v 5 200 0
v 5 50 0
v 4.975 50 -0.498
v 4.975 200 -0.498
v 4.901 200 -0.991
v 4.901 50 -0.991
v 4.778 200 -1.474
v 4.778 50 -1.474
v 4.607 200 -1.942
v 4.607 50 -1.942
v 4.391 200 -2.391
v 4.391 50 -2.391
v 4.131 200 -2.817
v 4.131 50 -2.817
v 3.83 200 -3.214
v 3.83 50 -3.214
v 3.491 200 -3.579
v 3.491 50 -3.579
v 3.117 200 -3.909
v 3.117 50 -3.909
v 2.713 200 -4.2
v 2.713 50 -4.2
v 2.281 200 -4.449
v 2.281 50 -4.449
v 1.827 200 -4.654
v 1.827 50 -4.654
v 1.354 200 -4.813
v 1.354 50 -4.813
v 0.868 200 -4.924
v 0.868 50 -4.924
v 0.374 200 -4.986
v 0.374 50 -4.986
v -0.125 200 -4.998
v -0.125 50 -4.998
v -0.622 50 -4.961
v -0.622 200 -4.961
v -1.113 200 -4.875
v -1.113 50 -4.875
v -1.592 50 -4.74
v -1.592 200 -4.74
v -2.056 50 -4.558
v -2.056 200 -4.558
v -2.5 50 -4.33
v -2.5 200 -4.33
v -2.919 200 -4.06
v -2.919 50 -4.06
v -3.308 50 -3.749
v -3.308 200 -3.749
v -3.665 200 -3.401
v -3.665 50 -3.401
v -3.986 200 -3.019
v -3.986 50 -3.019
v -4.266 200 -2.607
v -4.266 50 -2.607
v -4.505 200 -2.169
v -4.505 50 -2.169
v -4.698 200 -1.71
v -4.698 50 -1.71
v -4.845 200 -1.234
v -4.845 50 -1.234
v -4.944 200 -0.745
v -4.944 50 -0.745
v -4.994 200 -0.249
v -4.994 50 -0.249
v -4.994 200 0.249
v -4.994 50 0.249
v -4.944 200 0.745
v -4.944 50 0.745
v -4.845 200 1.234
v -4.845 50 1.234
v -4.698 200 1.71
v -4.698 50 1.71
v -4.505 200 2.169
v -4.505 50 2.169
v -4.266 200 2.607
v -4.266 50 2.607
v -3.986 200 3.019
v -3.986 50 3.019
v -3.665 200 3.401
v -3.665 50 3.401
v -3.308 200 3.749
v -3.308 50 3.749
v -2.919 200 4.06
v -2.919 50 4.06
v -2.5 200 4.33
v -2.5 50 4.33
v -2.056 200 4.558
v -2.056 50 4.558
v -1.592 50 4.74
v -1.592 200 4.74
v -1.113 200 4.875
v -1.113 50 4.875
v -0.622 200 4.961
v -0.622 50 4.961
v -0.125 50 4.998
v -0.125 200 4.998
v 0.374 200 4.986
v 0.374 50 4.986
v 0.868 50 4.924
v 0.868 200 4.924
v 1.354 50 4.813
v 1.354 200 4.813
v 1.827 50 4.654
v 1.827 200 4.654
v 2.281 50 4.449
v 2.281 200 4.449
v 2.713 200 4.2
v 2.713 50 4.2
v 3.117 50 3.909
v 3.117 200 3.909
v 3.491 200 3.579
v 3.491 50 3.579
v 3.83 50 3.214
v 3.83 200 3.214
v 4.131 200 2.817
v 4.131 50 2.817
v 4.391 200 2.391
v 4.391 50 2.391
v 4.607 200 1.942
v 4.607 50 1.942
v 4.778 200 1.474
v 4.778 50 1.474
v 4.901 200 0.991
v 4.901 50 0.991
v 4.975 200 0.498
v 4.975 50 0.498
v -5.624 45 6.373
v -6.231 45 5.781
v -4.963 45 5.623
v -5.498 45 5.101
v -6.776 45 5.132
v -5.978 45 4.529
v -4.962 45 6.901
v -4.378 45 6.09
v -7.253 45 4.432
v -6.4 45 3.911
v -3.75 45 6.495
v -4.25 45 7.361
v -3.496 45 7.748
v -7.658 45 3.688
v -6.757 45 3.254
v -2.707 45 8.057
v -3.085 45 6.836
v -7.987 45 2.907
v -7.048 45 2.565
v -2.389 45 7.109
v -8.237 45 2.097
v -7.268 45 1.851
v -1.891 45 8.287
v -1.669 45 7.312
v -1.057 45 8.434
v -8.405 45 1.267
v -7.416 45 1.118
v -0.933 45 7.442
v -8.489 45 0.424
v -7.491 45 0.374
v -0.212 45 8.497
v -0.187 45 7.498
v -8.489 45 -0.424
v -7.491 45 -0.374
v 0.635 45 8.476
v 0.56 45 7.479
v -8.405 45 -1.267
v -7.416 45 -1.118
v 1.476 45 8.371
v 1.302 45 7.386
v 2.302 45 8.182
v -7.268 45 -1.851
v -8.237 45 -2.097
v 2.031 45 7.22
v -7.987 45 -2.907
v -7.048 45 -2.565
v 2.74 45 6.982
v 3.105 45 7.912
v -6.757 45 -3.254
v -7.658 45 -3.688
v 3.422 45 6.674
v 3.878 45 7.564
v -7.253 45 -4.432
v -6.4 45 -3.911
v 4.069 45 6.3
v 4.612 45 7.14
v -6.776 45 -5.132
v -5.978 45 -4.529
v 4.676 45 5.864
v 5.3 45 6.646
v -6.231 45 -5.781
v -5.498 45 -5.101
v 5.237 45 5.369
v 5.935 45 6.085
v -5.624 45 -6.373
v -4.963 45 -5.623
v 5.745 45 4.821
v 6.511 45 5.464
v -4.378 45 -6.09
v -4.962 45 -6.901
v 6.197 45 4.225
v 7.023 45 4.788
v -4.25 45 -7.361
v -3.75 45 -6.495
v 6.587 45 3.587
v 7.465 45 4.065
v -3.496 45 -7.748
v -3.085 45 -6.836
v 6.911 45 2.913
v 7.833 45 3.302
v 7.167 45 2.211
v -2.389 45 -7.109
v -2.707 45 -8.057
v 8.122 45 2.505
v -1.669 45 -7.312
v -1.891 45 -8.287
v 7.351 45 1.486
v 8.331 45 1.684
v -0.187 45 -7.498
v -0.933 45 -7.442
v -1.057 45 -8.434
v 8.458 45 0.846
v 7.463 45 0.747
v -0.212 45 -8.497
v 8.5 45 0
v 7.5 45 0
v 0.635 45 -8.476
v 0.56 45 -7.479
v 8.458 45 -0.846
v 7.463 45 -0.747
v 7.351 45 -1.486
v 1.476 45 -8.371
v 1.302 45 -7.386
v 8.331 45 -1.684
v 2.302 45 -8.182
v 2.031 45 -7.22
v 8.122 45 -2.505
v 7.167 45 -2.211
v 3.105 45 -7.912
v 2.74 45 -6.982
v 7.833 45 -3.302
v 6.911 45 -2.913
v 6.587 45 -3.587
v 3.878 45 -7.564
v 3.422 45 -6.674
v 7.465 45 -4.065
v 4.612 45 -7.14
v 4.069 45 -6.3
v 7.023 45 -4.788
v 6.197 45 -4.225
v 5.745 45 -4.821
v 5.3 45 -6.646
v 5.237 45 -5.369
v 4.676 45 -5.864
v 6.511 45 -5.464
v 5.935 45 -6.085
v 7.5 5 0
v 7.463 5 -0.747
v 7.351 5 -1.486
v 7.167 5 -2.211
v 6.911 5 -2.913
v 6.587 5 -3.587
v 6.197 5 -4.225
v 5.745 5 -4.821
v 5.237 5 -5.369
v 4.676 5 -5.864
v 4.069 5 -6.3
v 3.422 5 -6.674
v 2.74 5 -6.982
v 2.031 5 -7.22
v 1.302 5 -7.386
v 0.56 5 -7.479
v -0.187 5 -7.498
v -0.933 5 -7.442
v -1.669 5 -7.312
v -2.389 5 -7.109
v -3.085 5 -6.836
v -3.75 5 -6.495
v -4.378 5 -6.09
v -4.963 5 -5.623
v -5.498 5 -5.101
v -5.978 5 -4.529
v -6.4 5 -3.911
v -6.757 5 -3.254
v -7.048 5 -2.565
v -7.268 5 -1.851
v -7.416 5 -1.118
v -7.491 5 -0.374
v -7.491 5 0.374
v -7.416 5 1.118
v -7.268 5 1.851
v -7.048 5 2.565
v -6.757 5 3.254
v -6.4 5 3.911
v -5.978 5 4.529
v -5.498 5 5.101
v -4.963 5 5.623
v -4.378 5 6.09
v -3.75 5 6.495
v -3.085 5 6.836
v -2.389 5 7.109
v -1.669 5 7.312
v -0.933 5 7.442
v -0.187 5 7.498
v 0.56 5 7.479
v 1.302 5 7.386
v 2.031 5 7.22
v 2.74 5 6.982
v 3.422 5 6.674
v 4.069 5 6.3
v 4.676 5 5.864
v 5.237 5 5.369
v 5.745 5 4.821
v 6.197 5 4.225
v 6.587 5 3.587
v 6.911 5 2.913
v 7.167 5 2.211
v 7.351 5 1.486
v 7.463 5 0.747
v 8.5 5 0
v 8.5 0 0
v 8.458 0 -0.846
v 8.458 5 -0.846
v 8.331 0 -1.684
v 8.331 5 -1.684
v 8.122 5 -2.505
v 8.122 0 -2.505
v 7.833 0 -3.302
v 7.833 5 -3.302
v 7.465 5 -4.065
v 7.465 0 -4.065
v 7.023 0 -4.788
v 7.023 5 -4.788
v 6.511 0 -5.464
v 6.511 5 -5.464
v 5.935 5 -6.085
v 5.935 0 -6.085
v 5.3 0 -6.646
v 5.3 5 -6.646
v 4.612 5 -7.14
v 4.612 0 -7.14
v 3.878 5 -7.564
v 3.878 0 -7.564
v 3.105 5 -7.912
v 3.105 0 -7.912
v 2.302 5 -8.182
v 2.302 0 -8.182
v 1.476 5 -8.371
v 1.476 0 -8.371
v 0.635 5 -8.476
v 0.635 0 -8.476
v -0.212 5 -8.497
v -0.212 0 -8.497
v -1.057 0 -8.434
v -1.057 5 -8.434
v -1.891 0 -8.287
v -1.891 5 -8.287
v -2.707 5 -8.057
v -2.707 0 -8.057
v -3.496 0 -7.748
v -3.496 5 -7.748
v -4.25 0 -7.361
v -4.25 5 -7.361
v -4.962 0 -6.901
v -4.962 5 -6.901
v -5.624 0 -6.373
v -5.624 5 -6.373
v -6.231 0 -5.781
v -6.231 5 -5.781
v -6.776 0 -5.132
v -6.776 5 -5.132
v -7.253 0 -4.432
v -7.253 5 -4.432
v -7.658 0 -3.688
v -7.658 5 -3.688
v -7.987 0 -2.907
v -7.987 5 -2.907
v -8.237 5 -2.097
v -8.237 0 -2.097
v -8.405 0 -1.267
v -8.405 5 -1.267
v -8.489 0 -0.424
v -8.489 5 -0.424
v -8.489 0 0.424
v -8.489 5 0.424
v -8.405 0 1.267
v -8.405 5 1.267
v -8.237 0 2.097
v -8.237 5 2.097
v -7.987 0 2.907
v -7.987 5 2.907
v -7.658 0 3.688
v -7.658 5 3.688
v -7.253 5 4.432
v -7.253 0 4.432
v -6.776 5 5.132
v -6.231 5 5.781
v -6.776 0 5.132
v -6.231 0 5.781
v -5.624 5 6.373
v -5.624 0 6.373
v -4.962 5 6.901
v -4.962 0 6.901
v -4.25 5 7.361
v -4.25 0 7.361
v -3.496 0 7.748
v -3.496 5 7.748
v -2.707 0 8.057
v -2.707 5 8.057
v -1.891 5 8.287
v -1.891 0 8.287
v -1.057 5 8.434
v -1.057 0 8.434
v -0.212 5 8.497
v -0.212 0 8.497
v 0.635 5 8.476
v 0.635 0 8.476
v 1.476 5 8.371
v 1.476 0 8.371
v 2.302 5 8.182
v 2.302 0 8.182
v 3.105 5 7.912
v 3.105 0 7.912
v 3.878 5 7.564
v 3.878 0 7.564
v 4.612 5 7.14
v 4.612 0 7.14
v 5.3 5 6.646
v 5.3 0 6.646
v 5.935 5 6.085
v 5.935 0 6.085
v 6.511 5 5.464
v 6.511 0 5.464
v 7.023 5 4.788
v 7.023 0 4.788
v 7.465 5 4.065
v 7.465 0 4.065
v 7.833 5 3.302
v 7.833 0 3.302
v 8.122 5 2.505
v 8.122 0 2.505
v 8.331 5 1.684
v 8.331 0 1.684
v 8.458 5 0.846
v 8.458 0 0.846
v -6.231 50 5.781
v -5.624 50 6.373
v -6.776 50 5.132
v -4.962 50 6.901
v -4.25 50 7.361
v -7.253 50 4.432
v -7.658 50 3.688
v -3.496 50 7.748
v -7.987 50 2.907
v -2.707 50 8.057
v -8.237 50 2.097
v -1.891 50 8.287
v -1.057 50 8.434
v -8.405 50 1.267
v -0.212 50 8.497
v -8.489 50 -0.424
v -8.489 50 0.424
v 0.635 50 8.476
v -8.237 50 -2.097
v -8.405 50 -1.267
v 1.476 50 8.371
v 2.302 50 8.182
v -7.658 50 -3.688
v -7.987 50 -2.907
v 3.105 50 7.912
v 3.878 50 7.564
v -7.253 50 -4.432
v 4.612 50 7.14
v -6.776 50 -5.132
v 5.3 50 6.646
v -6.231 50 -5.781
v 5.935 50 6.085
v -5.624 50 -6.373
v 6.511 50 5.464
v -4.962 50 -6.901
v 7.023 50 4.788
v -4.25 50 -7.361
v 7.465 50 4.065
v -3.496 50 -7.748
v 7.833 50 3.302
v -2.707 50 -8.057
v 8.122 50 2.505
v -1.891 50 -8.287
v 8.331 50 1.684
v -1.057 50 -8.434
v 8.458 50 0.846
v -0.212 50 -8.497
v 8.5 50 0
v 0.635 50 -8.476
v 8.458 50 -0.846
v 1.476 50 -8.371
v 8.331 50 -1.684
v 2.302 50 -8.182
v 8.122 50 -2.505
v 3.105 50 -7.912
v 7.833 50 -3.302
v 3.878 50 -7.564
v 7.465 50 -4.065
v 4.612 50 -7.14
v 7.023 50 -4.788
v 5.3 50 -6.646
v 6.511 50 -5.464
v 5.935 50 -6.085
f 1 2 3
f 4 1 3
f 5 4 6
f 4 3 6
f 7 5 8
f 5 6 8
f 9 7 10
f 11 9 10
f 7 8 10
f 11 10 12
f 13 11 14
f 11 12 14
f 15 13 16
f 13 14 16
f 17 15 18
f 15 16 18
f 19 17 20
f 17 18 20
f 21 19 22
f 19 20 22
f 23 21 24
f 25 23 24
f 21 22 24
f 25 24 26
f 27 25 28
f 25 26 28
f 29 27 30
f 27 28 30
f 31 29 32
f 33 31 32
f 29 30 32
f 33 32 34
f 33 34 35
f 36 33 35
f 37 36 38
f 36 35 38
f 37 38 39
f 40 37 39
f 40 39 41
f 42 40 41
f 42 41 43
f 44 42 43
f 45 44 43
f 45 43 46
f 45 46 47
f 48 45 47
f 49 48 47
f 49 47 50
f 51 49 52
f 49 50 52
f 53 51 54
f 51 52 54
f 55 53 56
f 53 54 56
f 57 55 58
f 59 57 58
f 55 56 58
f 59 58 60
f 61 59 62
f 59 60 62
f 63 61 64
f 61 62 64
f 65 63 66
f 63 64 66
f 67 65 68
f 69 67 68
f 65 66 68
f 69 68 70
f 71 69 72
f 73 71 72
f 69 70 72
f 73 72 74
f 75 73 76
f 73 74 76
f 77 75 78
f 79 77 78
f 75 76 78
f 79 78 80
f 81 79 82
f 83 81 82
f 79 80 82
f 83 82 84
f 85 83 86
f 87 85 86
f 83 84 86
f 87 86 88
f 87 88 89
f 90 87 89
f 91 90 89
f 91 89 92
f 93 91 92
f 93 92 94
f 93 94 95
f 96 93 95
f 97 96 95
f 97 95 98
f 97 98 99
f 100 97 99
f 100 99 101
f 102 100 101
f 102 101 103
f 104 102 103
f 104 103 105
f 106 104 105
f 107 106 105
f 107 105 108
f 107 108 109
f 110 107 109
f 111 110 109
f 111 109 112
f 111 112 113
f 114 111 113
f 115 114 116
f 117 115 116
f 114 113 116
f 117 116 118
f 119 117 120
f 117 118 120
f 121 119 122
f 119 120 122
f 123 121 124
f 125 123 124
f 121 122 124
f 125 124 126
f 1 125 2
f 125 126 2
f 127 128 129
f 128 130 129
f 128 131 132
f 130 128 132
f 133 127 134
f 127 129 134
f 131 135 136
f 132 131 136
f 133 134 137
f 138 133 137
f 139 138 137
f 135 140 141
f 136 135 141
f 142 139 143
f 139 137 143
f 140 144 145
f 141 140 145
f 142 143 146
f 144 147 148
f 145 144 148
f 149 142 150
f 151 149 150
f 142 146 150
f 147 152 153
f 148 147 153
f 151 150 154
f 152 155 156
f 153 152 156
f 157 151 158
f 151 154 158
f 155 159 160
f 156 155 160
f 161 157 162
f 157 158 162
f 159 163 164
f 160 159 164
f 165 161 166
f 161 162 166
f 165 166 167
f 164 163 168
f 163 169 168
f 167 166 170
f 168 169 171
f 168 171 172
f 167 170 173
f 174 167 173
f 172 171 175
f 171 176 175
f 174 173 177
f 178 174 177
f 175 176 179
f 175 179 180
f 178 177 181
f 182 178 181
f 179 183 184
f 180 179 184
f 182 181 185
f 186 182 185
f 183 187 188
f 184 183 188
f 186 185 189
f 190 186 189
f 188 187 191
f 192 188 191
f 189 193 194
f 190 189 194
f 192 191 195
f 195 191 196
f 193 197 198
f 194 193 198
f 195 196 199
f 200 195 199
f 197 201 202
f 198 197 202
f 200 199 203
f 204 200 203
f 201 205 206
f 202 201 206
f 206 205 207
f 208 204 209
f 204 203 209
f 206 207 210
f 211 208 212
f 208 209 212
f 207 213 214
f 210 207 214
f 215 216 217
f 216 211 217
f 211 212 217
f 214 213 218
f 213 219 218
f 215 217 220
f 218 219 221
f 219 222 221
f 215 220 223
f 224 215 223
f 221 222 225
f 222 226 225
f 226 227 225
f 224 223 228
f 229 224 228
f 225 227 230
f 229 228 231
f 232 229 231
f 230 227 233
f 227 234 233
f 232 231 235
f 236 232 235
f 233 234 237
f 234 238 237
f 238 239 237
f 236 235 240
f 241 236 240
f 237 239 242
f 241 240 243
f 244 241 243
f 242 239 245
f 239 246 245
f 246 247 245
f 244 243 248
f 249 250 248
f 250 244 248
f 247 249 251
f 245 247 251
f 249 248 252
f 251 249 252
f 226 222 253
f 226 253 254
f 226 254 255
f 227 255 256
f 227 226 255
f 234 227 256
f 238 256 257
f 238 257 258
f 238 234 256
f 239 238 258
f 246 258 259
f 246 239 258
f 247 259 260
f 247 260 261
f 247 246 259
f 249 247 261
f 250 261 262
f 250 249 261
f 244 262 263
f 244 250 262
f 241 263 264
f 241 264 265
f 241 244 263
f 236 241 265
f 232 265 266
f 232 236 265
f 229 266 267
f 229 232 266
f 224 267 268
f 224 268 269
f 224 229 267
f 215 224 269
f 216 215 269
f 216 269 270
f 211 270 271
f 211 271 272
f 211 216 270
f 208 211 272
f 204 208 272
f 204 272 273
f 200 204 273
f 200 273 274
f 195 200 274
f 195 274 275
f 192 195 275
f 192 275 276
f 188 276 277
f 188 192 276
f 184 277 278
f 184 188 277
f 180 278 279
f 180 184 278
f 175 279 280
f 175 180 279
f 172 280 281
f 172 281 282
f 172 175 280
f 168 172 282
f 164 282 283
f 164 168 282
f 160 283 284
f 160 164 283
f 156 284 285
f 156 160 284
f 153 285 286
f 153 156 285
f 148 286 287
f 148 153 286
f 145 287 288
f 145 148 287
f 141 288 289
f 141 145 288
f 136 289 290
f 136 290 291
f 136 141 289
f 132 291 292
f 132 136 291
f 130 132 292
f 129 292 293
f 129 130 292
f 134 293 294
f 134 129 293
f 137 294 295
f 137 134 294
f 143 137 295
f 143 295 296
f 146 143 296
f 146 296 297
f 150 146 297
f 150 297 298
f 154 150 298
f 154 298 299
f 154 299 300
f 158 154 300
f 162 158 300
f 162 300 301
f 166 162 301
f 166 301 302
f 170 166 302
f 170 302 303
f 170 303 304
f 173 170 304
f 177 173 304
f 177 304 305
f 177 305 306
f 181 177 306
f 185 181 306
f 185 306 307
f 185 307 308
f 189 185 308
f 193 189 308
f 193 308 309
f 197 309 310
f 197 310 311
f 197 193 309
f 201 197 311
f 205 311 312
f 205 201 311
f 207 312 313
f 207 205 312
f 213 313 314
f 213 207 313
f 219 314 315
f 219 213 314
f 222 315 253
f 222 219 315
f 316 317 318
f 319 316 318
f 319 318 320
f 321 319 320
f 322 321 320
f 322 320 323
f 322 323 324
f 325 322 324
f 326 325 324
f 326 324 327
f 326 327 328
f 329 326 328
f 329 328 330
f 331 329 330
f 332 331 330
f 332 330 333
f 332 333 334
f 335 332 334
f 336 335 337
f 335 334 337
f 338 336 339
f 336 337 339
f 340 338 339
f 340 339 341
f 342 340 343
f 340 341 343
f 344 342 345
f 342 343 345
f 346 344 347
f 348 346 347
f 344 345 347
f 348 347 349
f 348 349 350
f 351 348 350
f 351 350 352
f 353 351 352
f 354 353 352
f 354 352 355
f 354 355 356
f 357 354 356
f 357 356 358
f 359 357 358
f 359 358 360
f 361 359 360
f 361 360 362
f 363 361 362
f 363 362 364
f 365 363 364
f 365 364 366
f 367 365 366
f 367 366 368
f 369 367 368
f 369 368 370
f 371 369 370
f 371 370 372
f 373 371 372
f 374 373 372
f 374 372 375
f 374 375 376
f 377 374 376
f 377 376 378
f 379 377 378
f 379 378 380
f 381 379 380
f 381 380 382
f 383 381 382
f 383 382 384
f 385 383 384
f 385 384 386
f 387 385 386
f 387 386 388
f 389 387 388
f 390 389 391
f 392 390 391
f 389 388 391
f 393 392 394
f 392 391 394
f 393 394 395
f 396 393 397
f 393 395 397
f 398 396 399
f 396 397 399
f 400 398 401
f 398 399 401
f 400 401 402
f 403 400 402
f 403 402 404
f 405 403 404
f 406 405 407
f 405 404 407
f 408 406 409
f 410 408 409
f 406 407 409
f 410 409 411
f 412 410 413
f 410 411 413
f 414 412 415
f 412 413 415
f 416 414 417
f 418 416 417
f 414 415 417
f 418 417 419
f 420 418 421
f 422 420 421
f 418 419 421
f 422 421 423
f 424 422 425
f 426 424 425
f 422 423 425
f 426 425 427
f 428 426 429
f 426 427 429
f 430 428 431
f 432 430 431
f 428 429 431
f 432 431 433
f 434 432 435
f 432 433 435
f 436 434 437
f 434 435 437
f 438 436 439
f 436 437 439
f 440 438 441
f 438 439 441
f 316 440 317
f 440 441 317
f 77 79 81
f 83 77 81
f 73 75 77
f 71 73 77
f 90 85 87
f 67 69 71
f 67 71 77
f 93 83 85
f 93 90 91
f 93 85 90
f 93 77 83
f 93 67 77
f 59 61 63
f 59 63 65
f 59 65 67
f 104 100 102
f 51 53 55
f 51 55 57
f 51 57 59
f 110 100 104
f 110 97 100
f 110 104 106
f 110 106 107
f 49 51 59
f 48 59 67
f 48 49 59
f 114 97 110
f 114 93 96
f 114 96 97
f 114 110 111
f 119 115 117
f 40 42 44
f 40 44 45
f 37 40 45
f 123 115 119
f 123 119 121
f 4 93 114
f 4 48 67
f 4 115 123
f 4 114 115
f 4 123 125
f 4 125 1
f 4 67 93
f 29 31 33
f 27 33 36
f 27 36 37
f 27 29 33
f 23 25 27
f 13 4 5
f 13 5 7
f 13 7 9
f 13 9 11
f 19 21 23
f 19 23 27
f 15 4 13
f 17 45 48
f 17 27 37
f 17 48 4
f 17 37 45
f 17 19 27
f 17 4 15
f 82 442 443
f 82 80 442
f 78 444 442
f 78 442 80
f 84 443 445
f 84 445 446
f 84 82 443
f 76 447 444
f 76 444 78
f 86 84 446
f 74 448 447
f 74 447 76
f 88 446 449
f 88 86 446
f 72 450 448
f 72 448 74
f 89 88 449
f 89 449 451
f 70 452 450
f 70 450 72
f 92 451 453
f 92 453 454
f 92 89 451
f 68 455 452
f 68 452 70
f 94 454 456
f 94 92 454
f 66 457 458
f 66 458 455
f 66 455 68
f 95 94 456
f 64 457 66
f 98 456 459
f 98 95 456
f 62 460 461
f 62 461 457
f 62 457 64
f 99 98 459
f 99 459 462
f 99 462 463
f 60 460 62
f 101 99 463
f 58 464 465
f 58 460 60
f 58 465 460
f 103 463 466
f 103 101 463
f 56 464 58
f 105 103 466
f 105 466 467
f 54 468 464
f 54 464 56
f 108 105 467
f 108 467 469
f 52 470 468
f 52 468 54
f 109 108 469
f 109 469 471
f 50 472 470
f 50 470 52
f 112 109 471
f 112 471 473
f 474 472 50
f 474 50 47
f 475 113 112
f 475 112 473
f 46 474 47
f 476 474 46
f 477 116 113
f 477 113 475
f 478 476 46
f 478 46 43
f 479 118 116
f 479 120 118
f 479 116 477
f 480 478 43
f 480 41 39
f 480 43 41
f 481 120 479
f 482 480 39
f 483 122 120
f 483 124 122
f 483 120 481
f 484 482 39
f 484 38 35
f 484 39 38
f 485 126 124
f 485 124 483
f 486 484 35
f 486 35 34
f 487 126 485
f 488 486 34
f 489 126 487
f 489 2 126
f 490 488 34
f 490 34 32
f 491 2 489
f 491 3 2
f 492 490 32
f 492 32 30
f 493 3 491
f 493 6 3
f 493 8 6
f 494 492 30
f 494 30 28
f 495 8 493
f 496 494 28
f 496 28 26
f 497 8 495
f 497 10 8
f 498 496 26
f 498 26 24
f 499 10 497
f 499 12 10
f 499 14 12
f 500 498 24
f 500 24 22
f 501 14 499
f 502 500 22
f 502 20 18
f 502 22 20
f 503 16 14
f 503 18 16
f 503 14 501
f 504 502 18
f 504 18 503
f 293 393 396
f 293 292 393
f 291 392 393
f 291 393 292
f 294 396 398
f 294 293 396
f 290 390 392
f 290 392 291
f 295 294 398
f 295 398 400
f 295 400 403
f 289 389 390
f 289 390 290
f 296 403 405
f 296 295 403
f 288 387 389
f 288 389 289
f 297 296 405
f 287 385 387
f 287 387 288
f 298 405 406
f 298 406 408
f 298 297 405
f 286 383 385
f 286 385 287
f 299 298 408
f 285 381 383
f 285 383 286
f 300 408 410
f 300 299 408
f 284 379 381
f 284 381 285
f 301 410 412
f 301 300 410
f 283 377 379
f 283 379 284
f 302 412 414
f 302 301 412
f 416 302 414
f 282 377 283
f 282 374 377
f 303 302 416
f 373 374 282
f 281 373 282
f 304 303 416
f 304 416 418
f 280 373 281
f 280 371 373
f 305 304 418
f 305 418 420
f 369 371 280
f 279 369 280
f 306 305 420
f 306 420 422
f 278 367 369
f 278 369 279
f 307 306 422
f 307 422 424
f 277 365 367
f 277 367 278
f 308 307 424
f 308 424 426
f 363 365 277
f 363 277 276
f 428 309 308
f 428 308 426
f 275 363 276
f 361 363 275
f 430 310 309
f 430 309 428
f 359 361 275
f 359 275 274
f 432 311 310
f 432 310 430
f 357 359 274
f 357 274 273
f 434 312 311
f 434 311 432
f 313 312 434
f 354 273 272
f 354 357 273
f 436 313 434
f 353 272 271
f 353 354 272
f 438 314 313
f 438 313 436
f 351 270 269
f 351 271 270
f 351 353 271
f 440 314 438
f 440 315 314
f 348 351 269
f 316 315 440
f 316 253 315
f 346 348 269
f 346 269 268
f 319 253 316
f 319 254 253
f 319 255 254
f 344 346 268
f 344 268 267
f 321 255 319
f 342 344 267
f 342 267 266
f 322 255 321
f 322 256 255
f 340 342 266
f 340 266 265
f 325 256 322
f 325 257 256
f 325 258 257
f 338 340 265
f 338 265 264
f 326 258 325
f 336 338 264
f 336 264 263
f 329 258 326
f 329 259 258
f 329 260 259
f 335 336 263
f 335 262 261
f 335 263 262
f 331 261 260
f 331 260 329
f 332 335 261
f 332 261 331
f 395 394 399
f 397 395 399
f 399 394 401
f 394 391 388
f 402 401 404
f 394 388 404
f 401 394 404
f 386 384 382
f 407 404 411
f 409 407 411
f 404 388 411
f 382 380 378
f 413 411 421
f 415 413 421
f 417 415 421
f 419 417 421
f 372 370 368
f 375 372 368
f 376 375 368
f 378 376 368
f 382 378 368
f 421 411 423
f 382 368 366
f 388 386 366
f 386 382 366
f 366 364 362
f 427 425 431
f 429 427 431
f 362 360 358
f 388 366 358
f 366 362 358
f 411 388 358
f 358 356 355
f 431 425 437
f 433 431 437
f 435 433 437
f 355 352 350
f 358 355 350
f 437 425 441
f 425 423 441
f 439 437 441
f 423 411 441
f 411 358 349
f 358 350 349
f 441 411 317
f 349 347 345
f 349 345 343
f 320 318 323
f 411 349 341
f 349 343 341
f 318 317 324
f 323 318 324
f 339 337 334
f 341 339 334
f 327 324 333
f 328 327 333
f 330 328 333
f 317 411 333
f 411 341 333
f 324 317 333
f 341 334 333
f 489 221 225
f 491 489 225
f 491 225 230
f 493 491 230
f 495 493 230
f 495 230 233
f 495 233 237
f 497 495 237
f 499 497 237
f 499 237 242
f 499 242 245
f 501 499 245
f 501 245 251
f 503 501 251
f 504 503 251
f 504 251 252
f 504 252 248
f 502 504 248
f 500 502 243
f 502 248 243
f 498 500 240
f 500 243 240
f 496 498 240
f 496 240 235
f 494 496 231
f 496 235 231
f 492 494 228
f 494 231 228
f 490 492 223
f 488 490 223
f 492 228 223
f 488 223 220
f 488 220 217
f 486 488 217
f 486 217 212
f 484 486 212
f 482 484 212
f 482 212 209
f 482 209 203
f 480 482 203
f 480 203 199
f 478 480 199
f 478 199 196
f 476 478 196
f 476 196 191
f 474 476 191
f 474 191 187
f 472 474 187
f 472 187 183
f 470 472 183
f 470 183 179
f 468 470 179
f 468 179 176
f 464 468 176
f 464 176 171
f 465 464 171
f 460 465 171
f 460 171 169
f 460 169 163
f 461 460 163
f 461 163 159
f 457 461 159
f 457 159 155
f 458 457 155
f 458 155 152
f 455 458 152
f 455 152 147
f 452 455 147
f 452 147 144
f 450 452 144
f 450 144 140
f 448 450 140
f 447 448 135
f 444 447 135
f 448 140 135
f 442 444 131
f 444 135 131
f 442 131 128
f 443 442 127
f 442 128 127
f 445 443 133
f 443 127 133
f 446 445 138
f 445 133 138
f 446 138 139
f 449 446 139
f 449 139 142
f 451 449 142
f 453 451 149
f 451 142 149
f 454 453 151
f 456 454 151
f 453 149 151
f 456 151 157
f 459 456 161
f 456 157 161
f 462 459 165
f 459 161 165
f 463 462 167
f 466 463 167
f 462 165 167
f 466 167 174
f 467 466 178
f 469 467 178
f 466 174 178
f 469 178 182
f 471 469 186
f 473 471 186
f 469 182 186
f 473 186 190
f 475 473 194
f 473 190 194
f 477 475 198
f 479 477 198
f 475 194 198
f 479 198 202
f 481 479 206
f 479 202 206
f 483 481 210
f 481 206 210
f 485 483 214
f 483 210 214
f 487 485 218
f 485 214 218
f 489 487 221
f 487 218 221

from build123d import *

# Parameters (mm, degrees)
SKETCH1_R           = 8.5
BOSS_EXTRUDE1_DEPTH = 50
SKETCH2_R           = 5
BOSS_EXTRUDE2_DEPTH = 150
SKETCH3_R           = 8.5
SKETCH3_R_2         = 7.5
CUT_EXTRUDE1_DEPTH  = 40


with BuildPart() as part:
    # Sketch1 → Boss-Extrude1 (new body)
    with BuildSketch(Plane(origin=(0, 0, 0), x_dir=(1, 0, 0), z_dir=(0, 1, 0))):
        Circle(SKETCH1_R)
    extrude(amount=BOSS_EXTRUDE1_DEPTH)

    # Sketch2 → Boss-Extrude2 (add)
    with BuildSketch(Plane(origin=(0, 50, 0), x_dir=(1, 0, 0), z_dir=(0, 1, 0))):
        Circle(SKETCH2_R)
    extrude(amount=BOSS_EXTRUDE2_DEPTH)

    # Sketch3 → Cut-Extrude1 (cut)
    with BuildSketch(Plane(origin=(0, 45, 0), x_dir=(1, 0, 0), z_dir=(0, 1, 0))):
        Circle(SKETCH3_R)
        Circle(SKETCH3_R_2, mode=Mode.SUBTRACT)
    extrude(amount=-CUT_EXTRUDE1_DEPTH, mode=Mode.SUBTRACT)


solid = part.part
